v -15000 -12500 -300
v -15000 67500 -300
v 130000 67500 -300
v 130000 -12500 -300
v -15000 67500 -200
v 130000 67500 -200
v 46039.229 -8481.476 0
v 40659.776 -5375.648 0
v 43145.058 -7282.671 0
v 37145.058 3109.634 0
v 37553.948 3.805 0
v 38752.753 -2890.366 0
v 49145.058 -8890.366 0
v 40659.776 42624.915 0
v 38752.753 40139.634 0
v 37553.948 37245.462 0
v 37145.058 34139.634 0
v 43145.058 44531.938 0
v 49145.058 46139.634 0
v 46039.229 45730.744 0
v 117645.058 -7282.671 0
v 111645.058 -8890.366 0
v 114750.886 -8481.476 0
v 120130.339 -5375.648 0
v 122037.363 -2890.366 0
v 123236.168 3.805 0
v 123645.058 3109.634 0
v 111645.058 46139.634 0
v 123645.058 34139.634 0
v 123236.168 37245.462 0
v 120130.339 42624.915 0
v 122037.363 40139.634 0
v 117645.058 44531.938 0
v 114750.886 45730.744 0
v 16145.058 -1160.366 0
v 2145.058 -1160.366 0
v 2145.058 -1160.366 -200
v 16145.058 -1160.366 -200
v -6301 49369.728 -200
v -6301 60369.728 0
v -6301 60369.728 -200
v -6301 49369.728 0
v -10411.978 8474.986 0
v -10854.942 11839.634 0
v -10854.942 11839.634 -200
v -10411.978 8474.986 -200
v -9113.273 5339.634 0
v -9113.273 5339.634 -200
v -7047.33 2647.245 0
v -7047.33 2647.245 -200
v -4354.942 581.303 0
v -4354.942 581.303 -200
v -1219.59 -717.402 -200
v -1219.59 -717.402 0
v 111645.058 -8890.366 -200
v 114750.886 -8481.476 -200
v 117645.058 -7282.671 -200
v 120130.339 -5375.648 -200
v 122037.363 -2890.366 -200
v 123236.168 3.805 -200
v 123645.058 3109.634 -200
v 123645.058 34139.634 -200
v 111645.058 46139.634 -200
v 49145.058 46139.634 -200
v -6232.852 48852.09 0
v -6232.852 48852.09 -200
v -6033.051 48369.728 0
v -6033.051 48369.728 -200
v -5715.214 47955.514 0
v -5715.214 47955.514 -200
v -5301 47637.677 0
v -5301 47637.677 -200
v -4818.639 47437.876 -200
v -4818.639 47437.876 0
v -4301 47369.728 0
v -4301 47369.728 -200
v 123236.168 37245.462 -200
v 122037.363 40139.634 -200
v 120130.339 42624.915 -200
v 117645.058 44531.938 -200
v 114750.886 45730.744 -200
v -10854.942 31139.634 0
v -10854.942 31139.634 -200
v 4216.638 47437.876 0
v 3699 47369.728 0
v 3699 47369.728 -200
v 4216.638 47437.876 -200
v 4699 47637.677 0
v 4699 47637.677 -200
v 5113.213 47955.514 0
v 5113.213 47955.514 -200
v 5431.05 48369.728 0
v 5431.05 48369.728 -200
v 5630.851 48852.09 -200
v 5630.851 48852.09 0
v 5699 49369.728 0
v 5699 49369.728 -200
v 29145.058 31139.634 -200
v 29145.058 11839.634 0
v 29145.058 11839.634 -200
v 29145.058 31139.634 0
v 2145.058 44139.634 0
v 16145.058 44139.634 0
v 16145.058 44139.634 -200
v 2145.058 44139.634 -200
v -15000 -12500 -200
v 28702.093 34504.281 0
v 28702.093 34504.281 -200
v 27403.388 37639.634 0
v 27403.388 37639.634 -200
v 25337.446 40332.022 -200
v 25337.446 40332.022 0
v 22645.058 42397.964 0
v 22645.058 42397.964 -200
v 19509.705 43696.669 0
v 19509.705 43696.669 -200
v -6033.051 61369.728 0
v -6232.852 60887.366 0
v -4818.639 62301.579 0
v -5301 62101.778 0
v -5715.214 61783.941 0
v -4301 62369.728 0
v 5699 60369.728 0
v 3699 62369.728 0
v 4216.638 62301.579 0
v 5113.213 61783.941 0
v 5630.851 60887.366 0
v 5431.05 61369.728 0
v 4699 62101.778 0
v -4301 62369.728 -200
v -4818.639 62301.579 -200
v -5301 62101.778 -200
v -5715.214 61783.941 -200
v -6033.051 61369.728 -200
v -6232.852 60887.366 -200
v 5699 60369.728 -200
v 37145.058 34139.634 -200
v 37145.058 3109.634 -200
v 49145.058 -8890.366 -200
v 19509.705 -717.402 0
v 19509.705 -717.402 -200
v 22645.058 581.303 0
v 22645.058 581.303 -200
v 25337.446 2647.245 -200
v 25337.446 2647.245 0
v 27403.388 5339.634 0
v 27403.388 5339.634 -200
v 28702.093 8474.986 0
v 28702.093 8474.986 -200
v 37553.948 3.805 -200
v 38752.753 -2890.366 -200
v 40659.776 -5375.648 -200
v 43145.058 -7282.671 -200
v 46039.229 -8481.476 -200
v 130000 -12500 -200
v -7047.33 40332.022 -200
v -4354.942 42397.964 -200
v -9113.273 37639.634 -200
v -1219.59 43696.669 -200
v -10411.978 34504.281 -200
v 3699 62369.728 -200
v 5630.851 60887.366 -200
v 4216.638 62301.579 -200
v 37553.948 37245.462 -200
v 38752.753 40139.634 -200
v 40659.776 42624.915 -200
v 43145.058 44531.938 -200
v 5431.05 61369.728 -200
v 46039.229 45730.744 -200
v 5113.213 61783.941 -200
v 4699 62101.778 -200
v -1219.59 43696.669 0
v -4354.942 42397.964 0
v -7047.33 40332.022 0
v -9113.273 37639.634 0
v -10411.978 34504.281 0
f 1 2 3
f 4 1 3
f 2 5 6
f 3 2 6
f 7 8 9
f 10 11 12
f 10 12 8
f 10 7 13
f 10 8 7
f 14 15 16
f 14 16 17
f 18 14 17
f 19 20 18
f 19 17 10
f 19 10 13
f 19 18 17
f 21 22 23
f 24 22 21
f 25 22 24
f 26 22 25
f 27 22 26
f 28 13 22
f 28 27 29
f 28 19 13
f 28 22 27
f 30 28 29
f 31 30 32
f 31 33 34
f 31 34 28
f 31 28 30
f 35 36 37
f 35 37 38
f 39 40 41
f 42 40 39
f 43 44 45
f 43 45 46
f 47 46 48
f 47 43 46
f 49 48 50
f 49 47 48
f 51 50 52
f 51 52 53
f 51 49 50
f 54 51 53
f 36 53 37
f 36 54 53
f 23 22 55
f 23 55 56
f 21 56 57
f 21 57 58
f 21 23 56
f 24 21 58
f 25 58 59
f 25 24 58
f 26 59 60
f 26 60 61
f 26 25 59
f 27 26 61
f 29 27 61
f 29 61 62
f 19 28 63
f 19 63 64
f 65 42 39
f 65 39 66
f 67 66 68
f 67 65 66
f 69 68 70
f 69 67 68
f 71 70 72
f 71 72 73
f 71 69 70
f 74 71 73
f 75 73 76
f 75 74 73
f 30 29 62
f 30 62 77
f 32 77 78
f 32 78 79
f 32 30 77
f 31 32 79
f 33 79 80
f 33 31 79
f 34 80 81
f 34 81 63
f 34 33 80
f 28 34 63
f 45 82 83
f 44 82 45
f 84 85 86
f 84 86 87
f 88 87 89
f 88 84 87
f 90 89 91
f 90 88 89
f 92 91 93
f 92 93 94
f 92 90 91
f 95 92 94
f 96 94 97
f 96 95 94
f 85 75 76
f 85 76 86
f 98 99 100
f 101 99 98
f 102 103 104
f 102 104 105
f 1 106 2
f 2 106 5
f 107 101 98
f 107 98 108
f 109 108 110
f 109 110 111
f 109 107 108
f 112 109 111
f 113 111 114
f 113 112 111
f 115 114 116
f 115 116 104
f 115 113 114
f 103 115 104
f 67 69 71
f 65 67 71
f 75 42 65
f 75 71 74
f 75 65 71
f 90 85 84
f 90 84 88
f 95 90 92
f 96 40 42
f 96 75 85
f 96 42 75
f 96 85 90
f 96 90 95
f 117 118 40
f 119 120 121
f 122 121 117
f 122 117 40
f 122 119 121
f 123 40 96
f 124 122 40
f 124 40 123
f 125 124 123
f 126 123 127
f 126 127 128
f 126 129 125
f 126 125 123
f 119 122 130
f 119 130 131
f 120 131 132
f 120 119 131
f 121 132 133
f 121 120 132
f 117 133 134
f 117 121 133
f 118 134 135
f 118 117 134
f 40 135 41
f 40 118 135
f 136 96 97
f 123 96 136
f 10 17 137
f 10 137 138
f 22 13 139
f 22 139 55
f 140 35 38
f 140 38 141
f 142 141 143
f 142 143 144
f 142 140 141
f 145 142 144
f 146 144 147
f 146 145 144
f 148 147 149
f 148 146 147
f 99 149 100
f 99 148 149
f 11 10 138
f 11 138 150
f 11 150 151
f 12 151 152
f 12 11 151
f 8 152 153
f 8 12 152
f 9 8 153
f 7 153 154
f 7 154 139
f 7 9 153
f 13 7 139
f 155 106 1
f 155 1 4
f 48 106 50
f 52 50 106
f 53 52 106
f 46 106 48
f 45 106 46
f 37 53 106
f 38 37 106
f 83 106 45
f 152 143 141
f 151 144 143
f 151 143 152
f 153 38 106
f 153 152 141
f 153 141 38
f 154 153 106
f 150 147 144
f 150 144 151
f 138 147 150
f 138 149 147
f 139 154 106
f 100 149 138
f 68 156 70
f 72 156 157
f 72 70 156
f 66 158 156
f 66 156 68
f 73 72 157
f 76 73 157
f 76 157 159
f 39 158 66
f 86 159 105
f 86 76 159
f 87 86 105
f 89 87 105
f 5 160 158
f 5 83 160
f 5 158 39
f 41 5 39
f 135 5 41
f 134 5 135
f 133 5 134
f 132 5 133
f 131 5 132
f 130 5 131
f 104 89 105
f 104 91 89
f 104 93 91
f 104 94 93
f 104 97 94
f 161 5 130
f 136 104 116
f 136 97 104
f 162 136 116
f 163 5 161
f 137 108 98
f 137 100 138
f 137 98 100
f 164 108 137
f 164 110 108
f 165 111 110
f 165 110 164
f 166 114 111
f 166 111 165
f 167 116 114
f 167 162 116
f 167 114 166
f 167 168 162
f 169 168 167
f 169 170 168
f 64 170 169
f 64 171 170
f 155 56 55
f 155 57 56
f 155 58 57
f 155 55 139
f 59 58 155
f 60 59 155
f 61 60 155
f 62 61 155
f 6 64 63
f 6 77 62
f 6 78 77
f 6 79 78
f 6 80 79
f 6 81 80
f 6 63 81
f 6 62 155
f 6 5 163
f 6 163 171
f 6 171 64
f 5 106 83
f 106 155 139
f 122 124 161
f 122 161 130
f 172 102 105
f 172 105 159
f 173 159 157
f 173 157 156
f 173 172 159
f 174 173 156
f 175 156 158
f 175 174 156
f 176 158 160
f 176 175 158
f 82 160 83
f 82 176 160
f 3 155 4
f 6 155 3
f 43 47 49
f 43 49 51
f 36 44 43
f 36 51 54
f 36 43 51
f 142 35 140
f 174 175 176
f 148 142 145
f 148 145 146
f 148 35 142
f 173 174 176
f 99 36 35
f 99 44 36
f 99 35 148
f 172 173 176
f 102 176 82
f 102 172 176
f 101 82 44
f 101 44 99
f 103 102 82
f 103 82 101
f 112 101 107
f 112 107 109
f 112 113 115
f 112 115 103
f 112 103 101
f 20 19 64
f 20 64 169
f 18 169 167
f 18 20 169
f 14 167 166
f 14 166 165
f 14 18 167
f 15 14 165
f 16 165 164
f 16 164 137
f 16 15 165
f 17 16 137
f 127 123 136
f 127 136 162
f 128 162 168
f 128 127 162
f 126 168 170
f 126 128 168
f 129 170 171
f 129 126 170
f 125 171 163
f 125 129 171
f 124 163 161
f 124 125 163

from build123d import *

# Parameters (mm, degrees)
SKETCH1_W          = 145000
SKETCH1_H          = 80000
EXTRUDE1_DEPTH     = 300
SKETCH2_OUTSIDE_W  = 178123.044
SKETCH2_OUTSIDE_H  = 113123.044
CUT_EXTRUDE1_DEPTH = 200


with BuildPart() as part:
    # Sketch1 → Extrude1 (new body)
    with BuildSketch(Plane.XY):
        with Locations((57500, 27500)):
            Rectangle(SKETCH1_W, SKETCH1_H)
    extrude(amount=-EXTRUDE1_DEPTH)

    # Sketch2 outside → Cut-Extrude1 (cut)
    with BuildSketch(Plane.XY):
        with Locations((57500, 27500)):
            Rectangle(SKETCH2_OUTSIDE_W, SKETCH2_OUTSIDE_H)
        with BuildLine():
            Line((37145.057737679, 34139.633625626), (37145.057737679, 3109.633625626))
            ThreePointArc((37145.057737679, 3109.633625626), (40659.77636344, -5375.647748613), (49145.057737679, -8890.366374374))
            Line((49145.057737679, -8890.366374374), (111645.057737679, -8890.366374374))
            ThreePointArc((111645.057737679, -8890.366374374), (120130.339111917, -5375.647748613), (123645.057737679, 3109.633625626))
            Line((123645.057737679, 3109.633625626), (123645.057737679, 34139.633625626))
            ThreePointArc((123645.057737679, 34139.633625626), (120130.339111917, 42624.914999864), (111645.057737679, 46139.633625626))
            Line((111645.057737679, 46139.633625626), (49145.057737679, 46139.633625626))
            ThreePointArc((49145.057737679, 46139.633625626), (40659.77636344, 42624.914999864), (37145.057737679, 34139.633625626))
        make_face(mode=Mode.SUBTRACT)
        with BuildLine():
            Line((16145.057737679, 44139.633625626), (2145.057737679, 44139.633625626))
            ThreePointArc((2145.057737679, 44139.633625626), (-7047.330417747, 40332.021781051), (-10854.942262321, 31139.633625626))
            Line((-10854.942262321, 31139.633625626), (-10854.942262321, 11839.633625626))
            ThreePointArc((-10854.942262321, 11839.633625626), (-7047.330417747, 2647.245470201), (2145.057737679, -1160.366374374))
            Line((2145.057737679, -1160.366374374), (16145.057737679, -1160.366374374))
            ThreePointArc((16145.057737679, -1160.366374374), (25337.445893104, 2647.245470201), (29145.057737679, 11839.633625626))
            Line((29145.057737679, 11839.633625626), (29145.057737679, 31139.633625626))
            ThreePointArc((29145.057737679, 31139.633625626), (25337.445893104, 40332.021781051), (16145.057737679, 44139.633625626))
        make_face(mode=Mode.SUBTRACT)
        with BuildLine():
            Line((-6301.000457401, 60369.727650707), (-6301.000457401, 49369.727650707))
            ThreePointArc((-6301.000457401, 49369.727650707), (-5715.214019774, 47955.514088334), (-4301.000457401, 47369.727650707))
            Line((-4301.000457401, 47369.727650707), (3698.999542599, 47369.727650707))
            ThreePointArc((3698.999542599, 47369.727650707), (5113.213104972, 47955.514088334), (5698.999542599, 49369.727650707))
            Line((5698.999542599, 49369.727650707), (5698.999542599, 60369.727650707))
            ThreePointArc((5698.999542599, 60369.727650707), (5113.213104972, 61783.941213081), (3698.999542599, 62369.727650707))
            Line((3698.999542599, 62369.727650707), (-4301.000457401, 62369.727650707))
            ThreePointArc((-4301.000457401, 62369.727650707), (-5715.214019774, 61783.941213081), (-6301.000457401, 60369.727650707))
        make_face(mode=Mode.SUBTRACT)
    extrude(amount=-CUT_EXTRUDE1_DEPTH, mode=Mode.SUBTRACT)


solid = part.part
